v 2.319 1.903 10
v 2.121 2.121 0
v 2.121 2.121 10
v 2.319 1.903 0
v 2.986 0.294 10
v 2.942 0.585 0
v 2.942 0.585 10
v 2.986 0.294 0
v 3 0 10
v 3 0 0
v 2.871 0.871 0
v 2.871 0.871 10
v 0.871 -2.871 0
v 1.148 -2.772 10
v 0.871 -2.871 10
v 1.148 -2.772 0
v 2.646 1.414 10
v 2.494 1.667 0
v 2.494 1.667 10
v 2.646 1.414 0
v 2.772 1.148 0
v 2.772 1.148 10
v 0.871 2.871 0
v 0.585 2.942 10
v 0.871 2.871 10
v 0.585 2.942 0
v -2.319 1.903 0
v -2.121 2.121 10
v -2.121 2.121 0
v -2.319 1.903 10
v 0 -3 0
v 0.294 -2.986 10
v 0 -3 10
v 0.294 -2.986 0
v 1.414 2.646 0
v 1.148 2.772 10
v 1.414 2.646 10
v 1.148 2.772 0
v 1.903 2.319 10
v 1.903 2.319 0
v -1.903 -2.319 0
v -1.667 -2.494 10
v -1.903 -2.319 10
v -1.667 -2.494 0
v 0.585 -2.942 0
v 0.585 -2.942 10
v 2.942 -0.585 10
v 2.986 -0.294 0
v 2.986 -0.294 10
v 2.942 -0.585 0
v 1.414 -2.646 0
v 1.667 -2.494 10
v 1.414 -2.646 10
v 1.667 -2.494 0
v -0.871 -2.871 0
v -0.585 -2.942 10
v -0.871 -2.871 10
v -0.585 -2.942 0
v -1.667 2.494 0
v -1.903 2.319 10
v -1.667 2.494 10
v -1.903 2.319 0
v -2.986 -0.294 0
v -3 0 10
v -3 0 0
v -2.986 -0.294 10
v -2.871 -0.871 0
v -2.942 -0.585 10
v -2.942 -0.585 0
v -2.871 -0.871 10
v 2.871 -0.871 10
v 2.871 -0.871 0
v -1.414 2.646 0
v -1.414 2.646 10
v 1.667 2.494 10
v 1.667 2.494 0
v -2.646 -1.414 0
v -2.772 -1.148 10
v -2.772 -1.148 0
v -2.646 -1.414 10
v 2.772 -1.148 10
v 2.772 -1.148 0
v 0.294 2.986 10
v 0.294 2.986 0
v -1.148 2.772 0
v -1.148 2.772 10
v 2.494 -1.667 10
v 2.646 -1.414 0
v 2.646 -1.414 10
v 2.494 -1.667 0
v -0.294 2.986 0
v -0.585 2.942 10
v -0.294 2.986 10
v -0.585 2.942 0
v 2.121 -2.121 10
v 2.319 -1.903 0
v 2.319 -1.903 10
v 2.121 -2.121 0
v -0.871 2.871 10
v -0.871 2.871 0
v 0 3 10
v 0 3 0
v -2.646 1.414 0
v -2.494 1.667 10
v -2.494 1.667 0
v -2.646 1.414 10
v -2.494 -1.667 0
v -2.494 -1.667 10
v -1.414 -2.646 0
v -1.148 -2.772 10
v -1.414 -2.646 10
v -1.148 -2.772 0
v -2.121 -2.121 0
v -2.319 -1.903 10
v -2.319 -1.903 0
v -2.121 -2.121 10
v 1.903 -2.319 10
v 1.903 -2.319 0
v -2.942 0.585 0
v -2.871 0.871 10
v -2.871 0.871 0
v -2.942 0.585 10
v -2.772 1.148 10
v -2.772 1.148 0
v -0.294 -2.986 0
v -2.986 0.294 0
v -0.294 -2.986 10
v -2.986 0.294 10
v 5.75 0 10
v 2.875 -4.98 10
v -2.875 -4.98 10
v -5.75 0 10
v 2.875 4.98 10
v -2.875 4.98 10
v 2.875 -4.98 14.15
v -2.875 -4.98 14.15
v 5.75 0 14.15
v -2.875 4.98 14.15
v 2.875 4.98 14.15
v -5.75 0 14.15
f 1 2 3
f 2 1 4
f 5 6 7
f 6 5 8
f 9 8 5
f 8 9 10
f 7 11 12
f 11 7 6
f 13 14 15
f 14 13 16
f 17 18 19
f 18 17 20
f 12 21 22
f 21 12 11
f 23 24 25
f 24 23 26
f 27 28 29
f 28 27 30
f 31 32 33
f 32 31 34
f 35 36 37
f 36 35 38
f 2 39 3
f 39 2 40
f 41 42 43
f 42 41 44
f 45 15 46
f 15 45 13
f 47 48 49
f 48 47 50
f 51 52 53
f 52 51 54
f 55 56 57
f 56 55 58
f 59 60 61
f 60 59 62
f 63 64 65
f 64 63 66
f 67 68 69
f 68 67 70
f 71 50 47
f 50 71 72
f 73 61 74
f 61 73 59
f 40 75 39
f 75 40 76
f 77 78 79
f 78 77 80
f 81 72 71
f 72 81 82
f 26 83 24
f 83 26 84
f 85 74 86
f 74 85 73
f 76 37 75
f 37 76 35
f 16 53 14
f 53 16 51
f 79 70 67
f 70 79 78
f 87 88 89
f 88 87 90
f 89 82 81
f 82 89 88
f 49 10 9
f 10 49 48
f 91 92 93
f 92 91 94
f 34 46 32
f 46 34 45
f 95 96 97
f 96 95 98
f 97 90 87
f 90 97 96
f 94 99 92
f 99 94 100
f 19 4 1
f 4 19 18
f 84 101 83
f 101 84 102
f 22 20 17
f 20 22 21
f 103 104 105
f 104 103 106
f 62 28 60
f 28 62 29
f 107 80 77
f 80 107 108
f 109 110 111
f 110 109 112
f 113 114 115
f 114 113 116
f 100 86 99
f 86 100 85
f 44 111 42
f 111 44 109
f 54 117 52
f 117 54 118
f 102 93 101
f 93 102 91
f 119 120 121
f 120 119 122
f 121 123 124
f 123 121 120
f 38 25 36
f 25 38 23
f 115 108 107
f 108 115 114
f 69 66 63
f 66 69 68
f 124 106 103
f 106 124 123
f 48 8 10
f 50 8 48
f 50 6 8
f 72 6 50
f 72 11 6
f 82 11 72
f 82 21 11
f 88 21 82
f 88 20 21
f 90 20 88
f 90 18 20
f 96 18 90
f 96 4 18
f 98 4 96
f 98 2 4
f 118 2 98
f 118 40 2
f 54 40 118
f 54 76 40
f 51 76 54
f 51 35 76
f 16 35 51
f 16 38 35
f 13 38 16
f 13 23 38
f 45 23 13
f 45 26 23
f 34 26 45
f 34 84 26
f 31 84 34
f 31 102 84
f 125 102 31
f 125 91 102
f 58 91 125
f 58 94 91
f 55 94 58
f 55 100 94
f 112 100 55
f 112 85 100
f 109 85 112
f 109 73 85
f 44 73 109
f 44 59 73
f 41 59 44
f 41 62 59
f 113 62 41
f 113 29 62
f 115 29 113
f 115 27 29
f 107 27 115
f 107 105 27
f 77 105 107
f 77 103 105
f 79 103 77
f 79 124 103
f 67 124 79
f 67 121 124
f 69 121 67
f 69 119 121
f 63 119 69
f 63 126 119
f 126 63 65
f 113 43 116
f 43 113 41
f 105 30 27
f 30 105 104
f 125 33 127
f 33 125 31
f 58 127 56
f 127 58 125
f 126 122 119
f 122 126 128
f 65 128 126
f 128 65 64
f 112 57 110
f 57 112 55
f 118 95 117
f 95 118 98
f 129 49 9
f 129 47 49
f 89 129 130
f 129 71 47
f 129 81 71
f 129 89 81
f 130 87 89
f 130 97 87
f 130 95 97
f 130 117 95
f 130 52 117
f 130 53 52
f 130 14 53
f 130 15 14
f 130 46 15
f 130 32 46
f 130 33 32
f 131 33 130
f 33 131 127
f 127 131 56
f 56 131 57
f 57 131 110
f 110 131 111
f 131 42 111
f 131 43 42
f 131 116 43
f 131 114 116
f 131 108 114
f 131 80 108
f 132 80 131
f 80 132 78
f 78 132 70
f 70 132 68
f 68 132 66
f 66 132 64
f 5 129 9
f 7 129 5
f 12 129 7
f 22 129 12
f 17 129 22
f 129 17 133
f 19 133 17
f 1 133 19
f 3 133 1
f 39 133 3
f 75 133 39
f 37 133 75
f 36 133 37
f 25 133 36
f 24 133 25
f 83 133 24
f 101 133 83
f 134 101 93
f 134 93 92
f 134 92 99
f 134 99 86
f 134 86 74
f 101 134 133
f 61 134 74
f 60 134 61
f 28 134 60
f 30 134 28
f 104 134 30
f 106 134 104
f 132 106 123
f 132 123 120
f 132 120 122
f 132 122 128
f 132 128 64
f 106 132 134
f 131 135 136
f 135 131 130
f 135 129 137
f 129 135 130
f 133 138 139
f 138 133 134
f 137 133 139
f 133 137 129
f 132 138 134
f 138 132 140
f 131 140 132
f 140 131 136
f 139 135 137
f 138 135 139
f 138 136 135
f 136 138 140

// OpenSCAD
module hex_head_screw() {
    union() {
        // Screw shaft
        cylinder(h=10, d=6, $fn=64);
        
        // Hex head
        translate([0, 0, 10])
            cylinder(h=4.15, d1=11.5, d2=11.5, $fn=6);
    }
}

hex_head_screw();
